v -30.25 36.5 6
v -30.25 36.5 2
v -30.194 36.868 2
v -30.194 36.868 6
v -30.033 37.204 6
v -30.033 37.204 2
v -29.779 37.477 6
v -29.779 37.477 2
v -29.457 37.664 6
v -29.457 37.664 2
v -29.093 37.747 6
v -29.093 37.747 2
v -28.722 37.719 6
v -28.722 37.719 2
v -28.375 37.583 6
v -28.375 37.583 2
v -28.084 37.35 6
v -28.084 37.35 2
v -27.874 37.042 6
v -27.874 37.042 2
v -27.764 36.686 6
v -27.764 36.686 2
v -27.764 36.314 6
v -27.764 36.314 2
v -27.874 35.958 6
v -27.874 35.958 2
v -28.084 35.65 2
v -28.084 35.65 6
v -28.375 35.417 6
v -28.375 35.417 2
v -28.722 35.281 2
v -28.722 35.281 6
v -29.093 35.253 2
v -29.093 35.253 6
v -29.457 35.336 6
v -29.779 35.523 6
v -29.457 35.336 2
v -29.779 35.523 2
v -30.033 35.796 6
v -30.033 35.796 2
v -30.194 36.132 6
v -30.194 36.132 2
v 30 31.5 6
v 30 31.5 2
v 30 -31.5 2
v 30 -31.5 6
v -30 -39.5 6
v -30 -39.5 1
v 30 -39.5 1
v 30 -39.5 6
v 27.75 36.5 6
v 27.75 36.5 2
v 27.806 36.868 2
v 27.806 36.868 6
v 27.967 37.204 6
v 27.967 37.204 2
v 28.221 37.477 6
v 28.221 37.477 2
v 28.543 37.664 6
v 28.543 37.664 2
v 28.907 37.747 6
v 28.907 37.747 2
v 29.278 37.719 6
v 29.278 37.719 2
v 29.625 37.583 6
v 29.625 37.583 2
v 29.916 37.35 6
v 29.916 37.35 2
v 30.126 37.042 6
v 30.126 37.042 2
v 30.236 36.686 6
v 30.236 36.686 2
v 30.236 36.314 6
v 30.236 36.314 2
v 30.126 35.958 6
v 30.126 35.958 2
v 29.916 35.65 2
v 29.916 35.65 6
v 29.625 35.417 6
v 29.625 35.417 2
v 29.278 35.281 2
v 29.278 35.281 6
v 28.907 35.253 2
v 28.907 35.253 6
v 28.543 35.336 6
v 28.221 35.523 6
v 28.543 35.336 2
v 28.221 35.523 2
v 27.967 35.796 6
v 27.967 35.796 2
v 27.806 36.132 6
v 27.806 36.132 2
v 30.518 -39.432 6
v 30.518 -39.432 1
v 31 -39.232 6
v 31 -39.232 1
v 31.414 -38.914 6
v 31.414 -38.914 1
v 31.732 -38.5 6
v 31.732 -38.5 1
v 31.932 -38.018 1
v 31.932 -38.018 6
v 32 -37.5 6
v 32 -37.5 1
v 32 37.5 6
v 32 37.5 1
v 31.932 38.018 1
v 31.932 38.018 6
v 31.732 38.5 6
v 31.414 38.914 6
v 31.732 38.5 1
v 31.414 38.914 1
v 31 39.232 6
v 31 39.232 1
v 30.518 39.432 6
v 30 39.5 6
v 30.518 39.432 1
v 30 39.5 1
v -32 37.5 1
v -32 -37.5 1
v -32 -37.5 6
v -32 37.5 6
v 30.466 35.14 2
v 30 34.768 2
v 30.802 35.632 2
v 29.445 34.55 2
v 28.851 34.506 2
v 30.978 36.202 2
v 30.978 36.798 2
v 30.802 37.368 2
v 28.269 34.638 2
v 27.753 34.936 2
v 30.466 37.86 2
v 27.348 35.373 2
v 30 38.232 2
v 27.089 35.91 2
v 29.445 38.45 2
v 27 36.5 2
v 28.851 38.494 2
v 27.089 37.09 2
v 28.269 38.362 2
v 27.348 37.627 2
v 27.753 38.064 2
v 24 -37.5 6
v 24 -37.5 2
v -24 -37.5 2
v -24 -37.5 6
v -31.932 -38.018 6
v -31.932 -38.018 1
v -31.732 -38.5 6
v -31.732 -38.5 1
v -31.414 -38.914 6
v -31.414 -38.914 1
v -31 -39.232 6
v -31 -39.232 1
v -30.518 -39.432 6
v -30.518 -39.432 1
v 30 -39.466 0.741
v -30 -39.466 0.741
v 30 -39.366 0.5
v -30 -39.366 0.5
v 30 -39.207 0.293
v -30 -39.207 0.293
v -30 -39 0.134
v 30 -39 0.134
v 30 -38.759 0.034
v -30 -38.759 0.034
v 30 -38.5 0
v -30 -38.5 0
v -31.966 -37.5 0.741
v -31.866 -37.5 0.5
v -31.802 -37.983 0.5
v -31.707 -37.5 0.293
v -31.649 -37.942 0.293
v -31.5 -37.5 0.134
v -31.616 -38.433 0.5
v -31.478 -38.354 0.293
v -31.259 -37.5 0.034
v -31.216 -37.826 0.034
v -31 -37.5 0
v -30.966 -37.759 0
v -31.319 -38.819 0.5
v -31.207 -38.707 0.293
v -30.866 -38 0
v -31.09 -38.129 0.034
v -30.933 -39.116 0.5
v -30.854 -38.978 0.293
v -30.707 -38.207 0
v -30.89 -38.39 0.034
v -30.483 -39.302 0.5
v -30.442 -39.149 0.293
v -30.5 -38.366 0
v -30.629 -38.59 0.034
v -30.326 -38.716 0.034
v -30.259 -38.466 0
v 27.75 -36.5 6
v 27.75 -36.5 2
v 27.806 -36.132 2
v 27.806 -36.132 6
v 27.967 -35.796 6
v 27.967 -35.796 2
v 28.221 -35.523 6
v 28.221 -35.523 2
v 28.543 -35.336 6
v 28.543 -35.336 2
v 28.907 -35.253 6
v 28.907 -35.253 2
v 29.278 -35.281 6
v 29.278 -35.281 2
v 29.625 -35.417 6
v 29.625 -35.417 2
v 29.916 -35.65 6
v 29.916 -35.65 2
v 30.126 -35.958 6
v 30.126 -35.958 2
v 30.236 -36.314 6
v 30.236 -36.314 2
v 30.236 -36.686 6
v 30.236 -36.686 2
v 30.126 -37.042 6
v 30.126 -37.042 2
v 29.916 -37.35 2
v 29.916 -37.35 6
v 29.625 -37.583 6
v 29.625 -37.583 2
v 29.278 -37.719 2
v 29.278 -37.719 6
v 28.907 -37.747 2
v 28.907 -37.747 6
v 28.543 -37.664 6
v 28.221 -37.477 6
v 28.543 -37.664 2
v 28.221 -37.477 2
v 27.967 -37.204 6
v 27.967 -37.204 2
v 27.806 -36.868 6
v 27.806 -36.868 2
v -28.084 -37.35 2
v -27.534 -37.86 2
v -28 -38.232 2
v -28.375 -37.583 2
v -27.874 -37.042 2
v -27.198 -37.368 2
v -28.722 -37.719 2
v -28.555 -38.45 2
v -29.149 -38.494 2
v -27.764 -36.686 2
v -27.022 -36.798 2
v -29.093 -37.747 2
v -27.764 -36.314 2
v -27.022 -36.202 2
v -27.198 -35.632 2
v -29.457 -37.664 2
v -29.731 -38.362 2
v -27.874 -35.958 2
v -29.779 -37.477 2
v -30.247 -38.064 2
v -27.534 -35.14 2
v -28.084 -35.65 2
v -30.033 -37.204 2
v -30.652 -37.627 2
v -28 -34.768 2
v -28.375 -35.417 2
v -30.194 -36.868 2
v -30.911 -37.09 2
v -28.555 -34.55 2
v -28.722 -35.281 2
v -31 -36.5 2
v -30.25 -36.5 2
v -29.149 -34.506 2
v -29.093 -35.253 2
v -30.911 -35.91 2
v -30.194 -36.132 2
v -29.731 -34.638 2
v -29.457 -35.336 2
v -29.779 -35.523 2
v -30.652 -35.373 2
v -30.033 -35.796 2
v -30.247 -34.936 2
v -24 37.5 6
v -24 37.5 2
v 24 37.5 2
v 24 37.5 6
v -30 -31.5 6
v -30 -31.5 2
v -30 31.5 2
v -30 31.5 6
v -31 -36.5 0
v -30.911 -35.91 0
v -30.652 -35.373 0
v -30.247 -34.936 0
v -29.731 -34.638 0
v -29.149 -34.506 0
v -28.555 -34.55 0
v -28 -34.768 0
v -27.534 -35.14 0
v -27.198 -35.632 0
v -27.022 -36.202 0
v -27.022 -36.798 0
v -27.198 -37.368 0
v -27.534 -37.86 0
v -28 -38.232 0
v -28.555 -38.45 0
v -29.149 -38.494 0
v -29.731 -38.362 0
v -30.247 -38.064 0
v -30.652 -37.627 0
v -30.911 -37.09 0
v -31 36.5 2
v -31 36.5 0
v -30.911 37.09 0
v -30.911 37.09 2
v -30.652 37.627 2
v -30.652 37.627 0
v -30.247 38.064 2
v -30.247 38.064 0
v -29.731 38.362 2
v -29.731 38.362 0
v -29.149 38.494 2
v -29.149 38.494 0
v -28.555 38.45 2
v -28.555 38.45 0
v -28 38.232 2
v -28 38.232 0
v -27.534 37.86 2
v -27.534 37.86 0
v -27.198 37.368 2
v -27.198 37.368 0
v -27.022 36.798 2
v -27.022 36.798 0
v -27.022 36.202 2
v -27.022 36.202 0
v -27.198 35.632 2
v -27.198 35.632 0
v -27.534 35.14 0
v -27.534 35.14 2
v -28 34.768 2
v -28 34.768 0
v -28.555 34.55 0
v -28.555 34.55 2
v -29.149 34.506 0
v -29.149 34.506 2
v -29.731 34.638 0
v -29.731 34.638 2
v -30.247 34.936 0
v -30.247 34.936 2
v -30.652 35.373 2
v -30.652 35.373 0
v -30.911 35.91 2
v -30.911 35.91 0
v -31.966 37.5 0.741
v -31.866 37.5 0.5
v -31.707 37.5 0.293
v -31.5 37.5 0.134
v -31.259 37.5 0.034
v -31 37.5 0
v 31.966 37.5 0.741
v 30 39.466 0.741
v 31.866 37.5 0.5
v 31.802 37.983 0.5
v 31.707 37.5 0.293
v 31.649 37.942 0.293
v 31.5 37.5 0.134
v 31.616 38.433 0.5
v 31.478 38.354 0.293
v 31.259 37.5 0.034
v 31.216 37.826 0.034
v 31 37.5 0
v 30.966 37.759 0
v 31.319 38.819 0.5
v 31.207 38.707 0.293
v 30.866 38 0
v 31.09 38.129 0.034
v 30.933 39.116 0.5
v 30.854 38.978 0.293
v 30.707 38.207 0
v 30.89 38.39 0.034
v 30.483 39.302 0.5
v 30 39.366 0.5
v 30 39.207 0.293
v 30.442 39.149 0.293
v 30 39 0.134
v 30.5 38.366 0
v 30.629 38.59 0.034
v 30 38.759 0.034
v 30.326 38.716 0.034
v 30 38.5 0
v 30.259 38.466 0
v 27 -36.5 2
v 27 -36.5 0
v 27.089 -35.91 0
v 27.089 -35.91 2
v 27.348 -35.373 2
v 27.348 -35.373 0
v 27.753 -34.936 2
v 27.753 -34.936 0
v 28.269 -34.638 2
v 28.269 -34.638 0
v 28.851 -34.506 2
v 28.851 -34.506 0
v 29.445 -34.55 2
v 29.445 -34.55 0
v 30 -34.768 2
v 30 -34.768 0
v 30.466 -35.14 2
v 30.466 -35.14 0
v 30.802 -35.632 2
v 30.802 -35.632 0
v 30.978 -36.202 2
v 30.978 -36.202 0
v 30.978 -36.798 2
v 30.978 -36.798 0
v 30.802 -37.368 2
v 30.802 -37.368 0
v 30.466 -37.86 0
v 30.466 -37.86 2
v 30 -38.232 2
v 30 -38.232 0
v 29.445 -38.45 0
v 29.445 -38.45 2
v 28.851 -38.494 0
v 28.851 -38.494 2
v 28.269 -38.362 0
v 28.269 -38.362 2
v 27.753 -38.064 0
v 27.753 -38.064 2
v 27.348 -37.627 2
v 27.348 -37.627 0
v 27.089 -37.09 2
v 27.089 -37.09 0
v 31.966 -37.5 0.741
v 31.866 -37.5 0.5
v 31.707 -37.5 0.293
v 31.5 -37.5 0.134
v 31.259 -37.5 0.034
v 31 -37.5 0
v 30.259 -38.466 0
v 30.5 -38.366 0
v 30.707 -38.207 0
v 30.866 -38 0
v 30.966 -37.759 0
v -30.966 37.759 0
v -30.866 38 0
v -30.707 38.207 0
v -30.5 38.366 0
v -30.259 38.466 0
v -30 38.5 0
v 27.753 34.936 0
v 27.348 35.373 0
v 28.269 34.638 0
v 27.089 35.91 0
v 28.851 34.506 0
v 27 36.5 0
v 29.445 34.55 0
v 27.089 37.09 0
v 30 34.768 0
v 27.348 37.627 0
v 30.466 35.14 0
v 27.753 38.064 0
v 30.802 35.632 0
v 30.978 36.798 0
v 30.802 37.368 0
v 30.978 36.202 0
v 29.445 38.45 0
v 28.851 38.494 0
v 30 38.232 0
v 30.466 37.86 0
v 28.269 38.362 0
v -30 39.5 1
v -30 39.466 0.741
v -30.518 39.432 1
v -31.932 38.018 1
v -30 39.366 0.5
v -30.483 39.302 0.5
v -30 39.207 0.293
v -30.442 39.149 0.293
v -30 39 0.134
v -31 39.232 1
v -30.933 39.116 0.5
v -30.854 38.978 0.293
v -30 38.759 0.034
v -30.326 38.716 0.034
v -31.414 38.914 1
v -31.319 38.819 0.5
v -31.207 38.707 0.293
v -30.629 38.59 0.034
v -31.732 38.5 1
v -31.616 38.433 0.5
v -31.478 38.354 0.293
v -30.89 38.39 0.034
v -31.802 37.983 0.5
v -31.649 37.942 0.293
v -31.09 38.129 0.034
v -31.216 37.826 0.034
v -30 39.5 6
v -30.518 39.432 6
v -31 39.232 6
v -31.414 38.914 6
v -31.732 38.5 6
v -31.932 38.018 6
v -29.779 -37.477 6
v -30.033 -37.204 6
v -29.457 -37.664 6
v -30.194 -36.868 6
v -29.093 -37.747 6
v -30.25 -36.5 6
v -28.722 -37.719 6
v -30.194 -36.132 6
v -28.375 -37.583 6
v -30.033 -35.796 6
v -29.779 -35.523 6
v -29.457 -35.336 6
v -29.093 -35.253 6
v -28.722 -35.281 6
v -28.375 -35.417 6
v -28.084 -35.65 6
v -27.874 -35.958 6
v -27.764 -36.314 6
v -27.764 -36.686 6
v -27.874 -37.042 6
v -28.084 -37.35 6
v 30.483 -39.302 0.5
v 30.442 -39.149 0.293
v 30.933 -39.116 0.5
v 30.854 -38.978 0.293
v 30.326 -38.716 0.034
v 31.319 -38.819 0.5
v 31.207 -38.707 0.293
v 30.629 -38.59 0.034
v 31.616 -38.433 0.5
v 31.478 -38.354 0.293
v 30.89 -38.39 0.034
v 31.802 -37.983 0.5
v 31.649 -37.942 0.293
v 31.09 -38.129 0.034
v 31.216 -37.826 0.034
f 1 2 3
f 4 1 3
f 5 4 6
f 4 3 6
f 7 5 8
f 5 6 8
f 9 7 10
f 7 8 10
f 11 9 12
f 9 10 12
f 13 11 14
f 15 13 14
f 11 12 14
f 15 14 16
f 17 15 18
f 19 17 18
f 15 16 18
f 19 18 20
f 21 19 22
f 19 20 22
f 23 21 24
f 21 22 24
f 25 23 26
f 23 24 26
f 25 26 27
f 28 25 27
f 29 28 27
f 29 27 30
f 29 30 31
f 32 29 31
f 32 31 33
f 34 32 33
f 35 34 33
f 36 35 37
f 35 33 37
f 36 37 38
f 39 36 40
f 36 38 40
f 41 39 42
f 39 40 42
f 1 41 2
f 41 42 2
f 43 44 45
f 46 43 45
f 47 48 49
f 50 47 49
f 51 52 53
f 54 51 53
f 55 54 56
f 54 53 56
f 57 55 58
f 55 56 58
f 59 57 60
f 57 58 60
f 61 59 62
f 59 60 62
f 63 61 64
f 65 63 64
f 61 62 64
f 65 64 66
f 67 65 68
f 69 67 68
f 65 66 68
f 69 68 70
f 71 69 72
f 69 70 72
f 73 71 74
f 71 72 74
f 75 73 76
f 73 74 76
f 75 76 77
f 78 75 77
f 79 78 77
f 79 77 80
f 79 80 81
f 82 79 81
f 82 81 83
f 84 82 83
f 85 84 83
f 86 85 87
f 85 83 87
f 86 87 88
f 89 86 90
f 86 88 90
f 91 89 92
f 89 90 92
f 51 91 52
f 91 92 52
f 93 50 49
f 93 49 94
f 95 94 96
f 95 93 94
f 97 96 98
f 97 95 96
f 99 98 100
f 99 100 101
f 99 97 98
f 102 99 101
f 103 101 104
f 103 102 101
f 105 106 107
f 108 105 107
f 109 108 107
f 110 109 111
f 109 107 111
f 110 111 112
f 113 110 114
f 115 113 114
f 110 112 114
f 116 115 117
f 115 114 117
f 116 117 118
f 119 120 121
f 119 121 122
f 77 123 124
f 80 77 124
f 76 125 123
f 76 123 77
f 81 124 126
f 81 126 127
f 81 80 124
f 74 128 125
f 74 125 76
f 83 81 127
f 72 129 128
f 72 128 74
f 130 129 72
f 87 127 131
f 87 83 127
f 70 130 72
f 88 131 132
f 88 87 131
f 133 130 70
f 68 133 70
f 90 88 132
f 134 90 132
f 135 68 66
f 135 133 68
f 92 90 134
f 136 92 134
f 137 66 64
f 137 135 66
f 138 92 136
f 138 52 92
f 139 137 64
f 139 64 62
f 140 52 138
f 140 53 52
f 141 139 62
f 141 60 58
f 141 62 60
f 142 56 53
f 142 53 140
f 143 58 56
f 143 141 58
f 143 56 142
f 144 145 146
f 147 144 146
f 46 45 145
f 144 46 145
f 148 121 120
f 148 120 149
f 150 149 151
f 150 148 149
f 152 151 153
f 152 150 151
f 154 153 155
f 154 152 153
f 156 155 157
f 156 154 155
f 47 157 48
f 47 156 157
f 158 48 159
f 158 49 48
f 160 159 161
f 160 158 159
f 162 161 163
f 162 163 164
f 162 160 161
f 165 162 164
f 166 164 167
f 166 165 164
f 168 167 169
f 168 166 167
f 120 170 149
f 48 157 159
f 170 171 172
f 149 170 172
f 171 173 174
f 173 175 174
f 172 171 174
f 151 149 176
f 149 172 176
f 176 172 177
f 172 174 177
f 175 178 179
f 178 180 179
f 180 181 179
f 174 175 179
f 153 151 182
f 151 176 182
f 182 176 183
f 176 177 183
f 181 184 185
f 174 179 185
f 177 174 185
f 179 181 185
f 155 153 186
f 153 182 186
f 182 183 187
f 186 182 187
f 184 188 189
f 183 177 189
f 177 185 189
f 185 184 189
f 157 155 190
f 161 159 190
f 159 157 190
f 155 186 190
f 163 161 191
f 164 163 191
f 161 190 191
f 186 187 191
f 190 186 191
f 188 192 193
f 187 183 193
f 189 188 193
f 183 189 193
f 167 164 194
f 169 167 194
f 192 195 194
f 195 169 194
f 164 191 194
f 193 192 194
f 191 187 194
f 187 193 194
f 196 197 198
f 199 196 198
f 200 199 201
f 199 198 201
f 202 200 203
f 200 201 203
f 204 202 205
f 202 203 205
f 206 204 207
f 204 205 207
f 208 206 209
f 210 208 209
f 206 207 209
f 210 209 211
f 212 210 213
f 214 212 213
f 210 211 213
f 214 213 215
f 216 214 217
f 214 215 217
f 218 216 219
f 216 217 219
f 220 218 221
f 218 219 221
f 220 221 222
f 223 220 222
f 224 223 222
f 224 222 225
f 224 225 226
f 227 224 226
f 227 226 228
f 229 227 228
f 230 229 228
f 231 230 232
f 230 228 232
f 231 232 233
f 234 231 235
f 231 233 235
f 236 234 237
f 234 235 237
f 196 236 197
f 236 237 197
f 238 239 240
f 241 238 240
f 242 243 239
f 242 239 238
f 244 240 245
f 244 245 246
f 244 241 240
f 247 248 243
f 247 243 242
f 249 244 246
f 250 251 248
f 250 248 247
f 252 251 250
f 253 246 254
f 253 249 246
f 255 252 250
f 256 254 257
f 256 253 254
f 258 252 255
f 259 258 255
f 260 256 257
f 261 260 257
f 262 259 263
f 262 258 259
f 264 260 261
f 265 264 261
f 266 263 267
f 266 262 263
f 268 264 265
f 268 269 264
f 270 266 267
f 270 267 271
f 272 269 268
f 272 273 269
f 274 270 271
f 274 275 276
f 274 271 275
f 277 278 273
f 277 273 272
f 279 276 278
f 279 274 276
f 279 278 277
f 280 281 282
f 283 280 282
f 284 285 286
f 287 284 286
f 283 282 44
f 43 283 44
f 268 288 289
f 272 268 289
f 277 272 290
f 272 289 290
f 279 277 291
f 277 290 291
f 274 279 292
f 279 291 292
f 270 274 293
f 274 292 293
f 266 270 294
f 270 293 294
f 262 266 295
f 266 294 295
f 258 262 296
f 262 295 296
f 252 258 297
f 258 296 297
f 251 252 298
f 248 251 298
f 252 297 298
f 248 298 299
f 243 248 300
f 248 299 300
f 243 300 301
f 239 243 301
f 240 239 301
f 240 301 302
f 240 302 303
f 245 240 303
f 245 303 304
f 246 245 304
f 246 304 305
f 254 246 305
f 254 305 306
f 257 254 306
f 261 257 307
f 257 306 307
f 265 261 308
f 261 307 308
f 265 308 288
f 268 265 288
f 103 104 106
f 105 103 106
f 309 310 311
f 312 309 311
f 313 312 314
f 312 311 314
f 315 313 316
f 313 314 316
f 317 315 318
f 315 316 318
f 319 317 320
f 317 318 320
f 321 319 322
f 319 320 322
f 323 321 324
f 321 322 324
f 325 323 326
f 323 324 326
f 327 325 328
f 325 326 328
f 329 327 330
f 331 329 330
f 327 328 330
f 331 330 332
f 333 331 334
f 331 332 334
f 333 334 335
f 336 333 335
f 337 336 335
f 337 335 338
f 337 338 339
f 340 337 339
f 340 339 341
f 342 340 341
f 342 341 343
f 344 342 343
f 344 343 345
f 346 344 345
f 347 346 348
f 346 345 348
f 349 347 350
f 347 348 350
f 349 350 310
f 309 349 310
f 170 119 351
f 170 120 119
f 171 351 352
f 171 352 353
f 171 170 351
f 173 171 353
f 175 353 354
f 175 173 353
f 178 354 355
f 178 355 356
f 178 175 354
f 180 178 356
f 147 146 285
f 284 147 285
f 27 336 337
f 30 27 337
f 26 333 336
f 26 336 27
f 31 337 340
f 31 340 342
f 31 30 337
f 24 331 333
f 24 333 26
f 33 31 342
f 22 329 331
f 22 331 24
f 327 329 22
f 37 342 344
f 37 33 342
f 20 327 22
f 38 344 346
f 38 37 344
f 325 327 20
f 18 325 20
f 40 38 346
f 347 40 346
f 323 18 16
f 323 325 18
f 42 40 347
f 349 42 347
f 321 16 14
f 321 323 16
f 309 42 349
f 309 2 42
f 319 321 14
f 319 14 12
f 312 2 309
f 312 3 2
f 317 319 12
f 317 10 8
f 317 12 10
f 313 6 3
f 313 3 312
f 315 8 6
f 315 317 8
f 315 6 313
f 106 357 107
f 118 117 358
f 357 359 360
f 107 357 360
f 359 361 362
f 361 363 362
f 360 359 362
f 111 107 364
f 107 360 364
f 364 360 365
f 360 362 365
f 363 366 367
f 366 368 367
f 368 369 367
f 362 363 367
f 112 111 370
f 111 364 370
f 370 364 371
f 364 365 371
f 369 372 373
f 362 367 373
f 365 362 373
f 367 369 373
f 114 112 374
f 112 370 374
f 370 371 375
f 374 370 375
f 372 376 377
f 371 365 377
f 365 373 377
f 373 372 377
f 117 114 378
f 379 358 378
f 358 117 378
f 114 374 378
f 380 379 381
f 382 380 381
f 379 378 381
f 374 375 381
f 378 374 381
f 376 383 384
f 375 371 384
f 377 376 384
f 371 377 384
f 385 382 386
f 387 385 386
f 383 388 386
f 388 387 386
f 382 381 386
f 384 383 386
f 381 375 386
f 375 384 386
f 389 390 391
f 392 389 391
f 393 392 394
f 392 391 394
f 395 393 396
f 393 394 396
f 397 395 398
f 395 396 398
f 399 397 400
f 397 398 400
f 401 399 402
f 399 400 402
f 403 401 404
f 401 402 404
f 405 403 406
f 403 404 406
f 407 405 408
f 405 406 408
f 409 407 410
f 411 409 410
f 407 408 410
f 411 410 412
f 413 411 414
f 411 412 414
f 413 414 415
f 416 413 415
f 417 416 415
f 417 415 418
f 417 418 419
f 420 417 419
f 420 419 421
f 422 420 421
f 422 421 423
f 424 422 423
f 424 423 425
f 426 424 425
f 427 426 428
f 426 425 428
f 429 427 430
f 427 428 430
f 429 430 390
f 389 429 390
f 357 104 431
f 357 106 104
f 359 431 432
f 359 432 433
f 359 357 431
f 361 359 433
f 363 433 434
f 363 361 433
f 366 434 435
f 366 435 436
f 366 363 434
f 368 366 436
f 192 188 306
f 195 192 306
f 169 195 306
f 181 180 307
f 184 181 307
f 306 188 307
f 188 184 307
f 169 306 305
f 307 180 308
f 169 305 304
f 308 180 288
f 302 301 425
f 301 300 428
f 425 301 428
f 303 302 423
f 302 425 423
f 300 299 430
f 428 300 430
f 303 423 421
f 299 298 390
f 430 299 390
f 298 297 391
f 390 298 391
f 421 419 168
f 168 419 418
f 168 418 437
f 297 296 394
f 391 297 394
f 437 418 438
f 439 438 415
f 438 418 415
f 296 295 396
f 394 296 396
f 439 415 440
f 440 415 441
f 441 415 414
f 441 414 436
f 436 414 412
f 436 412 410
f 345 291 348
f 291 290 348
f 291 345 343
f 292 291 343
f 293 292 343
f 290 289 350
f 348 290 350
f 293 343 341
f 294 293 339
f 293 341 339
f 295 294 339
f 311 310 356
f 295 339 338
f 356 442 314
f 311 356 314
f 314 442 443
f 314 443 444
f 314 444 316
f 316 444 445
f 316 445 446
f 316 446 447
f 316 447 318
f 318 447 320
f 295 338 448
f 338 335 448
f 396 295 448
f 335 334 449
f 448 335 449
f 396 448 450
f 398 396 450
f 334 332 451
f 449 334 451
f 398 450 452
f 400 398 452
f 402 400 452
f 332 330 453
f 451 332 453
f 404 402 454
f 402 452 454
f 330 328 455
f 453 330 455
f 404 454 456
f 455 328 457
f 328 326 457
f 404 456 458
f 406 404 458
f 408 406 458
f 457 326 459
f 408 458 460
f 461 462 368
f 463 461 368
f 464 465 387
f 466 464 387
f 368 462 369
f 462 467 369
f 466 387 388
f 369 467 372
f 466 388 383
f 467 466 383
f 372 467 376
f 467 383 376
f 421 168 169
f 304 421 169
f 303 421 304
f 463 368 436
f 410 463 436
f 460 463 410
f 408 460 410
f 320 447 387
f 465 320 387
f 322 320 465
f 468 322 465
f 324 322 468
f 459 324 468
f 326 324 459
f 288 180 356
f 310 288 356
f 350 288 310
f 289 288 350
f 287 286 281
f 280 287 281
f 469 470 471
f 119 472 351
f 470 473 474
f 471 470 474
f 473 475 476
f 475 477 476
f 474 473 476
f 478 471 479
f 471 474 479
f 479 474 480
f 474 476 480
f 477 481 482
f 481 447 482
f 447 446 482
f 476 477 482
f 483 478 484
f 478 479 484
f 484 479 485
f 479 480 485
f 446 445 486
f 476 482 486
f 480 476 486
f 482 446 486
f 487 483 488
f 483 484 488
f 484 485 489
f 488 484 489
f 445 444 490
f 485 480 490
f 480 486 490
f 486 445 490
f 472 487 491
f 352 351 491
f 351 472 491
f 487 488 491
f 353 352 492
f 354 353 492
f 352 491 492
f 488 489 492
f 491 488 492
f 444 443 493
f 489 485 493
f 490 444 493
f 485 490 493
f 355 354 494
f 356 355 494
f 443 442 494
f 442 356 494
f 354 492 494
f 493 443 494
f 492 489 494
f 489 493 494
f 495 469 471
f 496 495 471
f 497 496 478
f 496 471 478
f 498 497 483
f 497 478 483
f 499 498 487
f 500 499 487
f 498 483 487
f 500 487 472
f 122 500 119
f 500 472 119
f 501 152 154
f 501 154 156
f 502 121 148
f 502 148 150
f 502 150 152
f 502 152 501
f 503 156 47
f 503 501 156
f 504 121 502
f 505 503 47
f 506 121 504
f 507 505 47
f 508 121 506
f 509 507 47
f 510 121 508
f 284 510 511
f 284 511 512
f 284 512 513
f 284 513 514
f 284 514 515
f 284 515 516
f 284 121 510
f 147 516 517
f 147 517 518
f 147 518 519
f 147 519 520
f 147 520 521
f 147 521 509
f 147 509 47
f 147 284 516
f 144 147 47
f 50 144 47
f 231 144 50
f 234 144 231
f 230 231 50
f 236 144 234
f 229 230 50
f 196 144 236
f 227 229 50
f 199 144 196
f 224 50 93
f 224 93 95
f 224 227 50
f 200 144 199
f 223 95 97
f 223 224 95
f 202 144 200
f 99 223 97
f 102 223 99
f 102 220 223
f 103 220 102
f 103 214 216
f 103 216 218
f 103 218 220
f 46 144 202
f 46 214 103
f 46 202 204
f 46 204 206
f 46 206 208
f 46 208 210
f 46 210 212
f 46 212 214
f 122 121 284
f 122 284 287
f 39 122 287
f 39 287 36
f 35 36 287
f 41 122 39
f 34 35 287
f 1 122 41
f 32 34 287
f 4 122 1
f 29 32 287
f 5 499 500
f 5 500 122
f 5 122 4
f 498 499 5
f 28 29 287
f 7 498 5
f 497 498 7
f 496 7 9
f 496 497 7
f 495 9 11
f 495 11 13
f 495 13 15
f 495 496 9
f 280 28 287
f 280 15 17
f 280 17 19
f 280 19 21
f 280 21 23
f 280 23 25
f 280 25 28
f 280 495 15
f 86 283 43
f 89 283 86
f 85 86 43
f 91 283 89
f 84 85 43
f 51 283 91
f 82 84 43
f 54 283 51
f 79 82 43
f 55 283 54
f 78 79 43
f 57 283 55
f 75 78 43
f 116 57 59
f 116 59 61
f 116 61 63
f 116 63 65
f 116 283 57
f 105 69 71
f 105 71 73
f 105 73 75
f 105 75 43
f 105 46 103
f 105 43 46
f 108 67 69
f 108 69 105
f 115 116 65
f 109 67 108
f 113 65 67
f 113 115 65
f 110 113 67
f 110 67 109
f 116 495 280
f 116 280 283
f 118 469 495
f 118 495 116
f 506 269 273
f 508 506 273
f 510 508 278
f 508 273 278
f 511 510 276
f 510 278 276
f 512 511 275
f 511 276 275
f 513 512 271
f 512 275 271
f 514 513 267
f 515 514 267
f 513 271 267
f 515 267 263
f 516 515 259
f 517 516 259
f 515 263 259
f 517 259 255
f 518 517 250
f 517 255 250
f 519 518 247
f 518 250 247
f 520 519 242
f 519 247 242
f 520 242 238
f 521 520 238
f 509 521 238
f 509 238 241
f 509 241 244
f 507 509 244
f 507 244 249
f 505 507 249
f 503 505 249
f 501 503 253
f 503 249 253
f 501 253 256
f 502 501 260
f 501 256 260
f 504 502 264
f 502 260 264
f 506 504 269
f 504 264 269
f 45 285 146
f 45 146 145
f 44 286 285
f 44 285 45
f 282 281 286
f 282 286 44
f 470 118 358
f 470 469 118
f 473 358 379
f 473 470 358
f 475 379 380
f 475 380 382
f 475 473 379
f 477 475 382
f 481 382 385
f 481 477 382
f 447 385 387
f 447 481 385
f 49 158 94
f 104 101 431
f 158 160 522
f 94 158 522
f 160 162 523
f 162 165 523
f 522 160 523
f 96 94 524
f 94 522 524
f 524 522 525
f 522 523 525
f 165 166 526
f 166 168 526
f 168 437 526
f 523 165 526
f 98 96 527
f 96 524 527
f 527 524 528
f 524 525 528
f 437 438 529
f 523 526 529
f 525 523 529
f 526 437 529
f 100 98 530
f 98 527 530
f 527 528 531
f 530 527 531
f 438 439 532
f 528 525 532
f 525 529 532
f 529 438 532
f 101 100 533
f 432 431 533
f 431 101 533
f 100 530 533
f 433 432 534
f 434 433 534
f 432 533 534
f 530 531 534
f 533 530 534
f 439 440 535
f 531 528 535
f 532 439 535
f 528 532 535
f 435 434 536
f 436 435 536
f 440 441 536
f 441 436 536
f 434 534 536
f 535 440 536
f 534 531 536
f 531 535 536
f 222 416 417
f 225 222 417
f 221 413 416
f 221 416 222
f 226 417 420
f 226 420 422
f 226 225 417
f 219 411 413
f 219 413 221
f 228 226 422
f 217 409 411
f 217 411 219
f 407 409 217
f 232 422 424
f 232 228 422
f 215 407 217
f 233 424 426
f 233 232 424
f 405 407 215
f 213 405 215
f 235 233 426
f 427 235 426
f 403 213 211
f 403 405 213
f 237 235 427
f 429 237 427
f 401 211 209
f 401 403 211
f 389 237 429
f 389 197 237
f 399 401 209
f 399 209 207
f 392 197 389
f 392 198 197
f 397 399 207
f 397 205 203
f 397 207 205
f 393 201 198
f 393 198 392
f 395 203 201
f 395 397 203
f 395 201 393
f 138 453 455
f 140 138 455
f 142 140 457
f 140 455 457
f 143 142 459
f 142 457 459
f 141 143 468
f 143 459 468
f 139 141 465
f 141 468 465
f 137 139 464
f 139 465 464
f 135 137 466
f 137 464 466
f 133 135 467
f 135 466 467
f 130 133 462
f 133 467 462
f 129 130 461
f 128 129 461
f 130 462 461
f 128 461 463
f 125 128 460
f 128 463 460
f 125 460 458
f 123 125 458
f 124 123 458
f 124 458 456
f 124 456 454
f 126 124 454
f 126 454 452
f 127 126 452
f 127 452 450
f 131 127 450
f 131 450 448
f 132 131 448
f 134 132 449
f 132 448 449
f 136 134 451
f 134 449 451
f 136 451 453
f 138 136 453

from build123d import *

# Parameters (mm, degrees)
SKETCH1_W           = 64
SKETCH1_H           = 79
BOSS_EXTRUDE1_DEPTH = 2
SKETCH2_W           = 64
SKETCH2_H           = 79
BOSS_EXTRUDE6_DEPTH = 4
FILLET1_R           = 2
FILLET2_R           = 2
FILLET3_R           = 2
FILLET4_R           = 2
SKETCH4_R           = 2
CUT_EXTRUDE1_DEPTH  = 2
SKETCH6_R           = 1.25
CUT_EXTRUDE2_DEPTH  = 4
FILLET5_R           = 1


with BuildPart() as part:
    # Sketch1 → Boss-Extrude1 (new body)
    with BuildSketch(Plane.XY):
        Rectangle(SKETCH1_W, SKETCH1_H)
    extrude(amount=BOSS_EXTRUDE1_DEPTH)

    # Sketch2 → Boss-Extrude6 (add)
    with BuildSketch(Plane.XY.offset(2)):
        Rectangle(SKETCH2_W, SKETCH2_H)
        Polygon((-30, 31.5), (-24, 37.5), (24, 37.5), (30, 31.5), (30, -31.5), (24, -37.5), (-24, -37.5), (-30, -31.5), align=None, mode=Mode.SUBTRACT)
    extrude(amount=BOSS_EXTRUDE6_DEPTH)

    # Fillet1
    fillet1_edges = [part.edges().sort_by_distance(p)[0] for p in [
        (-32, -39.5, 3),
    ]]
    fillet(fillet1_edges, radius=FILLET1_R)

    # Fillet2
    fillet2_edges = [part.edges().sort_by_distance(p)[0] for p in [
        (32, -39.5, 3),
    ]]
    fillet(fillet2_edges, radius=FILLET2_R)

    # Fillet3
    fillet3_edges = [part.edges().sort_by_distance(p)[0] for p in [
        (32, 39.5, 3),
    ]]
    fillet(fillet3_edges, radius=FILLET3_R)

    # Fillet4
    fillet4_edges = [part.edges().sort_by_distance(p)[0] for p in [
        (-32, 39.5, 3),
    ]]
    fillet(fillet4_edges, radius=FILLET4_R)

    # Sketch4 → Cut-Extrude1 (cut)
    with BuildSketch(Plane(origin=(0, 0, 0), x_dir=(-1, 0, 0), z_dir=(0, 0, -1))):
        with Locations((29, 36.5)):
            Circle(SKETCH4_R)
        with Locations((29, -36.5)):
            Circle(SKETCH4_R)
        with Locations((-29, -36.5)):
            Circle(SKETCH4_R)
        with Locations((-29, 36.5)):
            Circle(SKETCH4_R)
    extrude(amount=-CUT_EXTRUDE1_DEPTH, mode=Mode.SUBTRACT)

    # Sketch6 → Cut-Extrude2 (cut)
    with BuildSketch(Plane(origin=(0, 0, 2), x_dir=(-1, 0, 0), z_dir=(0, 0, -1))):
        with Locations((29, 36.5)):
            Circle(SKETCH6_R)
        with Locations((29, -36.5)):
            Circle(SKETCH6_R)
        with Locations((-29, -36.5)):
            Circle(SKETCH6_R)
        with Locations((-29, 36.5)):
            Circle(SKETCH6_R)
    extrude(amount=-CUT_EXTRUDE2_DEPTH, mode=Mode.SUBTRACT)

    # Fillet5
    fillet5_edges = [part.edges().sort_by_distance(p)[0] for p in [
        (0, -39.5, 0),
        (-31.414213562, -38.914213562, 0),
        (32, 0, 0),
        (31.414213562, -38.914213562, 0),
        (0, 39.5, 0),
        (31.414213562, 38.914213562, 0),
        (-32, 0, 0),
        (-31.414213562, 38.914213562, 0),
    ]]
    fillet(fillet5_edges, radius=FILLET5_R - 0.0001)  # a hair under: the kernel refuses the full size


solid = part.part
